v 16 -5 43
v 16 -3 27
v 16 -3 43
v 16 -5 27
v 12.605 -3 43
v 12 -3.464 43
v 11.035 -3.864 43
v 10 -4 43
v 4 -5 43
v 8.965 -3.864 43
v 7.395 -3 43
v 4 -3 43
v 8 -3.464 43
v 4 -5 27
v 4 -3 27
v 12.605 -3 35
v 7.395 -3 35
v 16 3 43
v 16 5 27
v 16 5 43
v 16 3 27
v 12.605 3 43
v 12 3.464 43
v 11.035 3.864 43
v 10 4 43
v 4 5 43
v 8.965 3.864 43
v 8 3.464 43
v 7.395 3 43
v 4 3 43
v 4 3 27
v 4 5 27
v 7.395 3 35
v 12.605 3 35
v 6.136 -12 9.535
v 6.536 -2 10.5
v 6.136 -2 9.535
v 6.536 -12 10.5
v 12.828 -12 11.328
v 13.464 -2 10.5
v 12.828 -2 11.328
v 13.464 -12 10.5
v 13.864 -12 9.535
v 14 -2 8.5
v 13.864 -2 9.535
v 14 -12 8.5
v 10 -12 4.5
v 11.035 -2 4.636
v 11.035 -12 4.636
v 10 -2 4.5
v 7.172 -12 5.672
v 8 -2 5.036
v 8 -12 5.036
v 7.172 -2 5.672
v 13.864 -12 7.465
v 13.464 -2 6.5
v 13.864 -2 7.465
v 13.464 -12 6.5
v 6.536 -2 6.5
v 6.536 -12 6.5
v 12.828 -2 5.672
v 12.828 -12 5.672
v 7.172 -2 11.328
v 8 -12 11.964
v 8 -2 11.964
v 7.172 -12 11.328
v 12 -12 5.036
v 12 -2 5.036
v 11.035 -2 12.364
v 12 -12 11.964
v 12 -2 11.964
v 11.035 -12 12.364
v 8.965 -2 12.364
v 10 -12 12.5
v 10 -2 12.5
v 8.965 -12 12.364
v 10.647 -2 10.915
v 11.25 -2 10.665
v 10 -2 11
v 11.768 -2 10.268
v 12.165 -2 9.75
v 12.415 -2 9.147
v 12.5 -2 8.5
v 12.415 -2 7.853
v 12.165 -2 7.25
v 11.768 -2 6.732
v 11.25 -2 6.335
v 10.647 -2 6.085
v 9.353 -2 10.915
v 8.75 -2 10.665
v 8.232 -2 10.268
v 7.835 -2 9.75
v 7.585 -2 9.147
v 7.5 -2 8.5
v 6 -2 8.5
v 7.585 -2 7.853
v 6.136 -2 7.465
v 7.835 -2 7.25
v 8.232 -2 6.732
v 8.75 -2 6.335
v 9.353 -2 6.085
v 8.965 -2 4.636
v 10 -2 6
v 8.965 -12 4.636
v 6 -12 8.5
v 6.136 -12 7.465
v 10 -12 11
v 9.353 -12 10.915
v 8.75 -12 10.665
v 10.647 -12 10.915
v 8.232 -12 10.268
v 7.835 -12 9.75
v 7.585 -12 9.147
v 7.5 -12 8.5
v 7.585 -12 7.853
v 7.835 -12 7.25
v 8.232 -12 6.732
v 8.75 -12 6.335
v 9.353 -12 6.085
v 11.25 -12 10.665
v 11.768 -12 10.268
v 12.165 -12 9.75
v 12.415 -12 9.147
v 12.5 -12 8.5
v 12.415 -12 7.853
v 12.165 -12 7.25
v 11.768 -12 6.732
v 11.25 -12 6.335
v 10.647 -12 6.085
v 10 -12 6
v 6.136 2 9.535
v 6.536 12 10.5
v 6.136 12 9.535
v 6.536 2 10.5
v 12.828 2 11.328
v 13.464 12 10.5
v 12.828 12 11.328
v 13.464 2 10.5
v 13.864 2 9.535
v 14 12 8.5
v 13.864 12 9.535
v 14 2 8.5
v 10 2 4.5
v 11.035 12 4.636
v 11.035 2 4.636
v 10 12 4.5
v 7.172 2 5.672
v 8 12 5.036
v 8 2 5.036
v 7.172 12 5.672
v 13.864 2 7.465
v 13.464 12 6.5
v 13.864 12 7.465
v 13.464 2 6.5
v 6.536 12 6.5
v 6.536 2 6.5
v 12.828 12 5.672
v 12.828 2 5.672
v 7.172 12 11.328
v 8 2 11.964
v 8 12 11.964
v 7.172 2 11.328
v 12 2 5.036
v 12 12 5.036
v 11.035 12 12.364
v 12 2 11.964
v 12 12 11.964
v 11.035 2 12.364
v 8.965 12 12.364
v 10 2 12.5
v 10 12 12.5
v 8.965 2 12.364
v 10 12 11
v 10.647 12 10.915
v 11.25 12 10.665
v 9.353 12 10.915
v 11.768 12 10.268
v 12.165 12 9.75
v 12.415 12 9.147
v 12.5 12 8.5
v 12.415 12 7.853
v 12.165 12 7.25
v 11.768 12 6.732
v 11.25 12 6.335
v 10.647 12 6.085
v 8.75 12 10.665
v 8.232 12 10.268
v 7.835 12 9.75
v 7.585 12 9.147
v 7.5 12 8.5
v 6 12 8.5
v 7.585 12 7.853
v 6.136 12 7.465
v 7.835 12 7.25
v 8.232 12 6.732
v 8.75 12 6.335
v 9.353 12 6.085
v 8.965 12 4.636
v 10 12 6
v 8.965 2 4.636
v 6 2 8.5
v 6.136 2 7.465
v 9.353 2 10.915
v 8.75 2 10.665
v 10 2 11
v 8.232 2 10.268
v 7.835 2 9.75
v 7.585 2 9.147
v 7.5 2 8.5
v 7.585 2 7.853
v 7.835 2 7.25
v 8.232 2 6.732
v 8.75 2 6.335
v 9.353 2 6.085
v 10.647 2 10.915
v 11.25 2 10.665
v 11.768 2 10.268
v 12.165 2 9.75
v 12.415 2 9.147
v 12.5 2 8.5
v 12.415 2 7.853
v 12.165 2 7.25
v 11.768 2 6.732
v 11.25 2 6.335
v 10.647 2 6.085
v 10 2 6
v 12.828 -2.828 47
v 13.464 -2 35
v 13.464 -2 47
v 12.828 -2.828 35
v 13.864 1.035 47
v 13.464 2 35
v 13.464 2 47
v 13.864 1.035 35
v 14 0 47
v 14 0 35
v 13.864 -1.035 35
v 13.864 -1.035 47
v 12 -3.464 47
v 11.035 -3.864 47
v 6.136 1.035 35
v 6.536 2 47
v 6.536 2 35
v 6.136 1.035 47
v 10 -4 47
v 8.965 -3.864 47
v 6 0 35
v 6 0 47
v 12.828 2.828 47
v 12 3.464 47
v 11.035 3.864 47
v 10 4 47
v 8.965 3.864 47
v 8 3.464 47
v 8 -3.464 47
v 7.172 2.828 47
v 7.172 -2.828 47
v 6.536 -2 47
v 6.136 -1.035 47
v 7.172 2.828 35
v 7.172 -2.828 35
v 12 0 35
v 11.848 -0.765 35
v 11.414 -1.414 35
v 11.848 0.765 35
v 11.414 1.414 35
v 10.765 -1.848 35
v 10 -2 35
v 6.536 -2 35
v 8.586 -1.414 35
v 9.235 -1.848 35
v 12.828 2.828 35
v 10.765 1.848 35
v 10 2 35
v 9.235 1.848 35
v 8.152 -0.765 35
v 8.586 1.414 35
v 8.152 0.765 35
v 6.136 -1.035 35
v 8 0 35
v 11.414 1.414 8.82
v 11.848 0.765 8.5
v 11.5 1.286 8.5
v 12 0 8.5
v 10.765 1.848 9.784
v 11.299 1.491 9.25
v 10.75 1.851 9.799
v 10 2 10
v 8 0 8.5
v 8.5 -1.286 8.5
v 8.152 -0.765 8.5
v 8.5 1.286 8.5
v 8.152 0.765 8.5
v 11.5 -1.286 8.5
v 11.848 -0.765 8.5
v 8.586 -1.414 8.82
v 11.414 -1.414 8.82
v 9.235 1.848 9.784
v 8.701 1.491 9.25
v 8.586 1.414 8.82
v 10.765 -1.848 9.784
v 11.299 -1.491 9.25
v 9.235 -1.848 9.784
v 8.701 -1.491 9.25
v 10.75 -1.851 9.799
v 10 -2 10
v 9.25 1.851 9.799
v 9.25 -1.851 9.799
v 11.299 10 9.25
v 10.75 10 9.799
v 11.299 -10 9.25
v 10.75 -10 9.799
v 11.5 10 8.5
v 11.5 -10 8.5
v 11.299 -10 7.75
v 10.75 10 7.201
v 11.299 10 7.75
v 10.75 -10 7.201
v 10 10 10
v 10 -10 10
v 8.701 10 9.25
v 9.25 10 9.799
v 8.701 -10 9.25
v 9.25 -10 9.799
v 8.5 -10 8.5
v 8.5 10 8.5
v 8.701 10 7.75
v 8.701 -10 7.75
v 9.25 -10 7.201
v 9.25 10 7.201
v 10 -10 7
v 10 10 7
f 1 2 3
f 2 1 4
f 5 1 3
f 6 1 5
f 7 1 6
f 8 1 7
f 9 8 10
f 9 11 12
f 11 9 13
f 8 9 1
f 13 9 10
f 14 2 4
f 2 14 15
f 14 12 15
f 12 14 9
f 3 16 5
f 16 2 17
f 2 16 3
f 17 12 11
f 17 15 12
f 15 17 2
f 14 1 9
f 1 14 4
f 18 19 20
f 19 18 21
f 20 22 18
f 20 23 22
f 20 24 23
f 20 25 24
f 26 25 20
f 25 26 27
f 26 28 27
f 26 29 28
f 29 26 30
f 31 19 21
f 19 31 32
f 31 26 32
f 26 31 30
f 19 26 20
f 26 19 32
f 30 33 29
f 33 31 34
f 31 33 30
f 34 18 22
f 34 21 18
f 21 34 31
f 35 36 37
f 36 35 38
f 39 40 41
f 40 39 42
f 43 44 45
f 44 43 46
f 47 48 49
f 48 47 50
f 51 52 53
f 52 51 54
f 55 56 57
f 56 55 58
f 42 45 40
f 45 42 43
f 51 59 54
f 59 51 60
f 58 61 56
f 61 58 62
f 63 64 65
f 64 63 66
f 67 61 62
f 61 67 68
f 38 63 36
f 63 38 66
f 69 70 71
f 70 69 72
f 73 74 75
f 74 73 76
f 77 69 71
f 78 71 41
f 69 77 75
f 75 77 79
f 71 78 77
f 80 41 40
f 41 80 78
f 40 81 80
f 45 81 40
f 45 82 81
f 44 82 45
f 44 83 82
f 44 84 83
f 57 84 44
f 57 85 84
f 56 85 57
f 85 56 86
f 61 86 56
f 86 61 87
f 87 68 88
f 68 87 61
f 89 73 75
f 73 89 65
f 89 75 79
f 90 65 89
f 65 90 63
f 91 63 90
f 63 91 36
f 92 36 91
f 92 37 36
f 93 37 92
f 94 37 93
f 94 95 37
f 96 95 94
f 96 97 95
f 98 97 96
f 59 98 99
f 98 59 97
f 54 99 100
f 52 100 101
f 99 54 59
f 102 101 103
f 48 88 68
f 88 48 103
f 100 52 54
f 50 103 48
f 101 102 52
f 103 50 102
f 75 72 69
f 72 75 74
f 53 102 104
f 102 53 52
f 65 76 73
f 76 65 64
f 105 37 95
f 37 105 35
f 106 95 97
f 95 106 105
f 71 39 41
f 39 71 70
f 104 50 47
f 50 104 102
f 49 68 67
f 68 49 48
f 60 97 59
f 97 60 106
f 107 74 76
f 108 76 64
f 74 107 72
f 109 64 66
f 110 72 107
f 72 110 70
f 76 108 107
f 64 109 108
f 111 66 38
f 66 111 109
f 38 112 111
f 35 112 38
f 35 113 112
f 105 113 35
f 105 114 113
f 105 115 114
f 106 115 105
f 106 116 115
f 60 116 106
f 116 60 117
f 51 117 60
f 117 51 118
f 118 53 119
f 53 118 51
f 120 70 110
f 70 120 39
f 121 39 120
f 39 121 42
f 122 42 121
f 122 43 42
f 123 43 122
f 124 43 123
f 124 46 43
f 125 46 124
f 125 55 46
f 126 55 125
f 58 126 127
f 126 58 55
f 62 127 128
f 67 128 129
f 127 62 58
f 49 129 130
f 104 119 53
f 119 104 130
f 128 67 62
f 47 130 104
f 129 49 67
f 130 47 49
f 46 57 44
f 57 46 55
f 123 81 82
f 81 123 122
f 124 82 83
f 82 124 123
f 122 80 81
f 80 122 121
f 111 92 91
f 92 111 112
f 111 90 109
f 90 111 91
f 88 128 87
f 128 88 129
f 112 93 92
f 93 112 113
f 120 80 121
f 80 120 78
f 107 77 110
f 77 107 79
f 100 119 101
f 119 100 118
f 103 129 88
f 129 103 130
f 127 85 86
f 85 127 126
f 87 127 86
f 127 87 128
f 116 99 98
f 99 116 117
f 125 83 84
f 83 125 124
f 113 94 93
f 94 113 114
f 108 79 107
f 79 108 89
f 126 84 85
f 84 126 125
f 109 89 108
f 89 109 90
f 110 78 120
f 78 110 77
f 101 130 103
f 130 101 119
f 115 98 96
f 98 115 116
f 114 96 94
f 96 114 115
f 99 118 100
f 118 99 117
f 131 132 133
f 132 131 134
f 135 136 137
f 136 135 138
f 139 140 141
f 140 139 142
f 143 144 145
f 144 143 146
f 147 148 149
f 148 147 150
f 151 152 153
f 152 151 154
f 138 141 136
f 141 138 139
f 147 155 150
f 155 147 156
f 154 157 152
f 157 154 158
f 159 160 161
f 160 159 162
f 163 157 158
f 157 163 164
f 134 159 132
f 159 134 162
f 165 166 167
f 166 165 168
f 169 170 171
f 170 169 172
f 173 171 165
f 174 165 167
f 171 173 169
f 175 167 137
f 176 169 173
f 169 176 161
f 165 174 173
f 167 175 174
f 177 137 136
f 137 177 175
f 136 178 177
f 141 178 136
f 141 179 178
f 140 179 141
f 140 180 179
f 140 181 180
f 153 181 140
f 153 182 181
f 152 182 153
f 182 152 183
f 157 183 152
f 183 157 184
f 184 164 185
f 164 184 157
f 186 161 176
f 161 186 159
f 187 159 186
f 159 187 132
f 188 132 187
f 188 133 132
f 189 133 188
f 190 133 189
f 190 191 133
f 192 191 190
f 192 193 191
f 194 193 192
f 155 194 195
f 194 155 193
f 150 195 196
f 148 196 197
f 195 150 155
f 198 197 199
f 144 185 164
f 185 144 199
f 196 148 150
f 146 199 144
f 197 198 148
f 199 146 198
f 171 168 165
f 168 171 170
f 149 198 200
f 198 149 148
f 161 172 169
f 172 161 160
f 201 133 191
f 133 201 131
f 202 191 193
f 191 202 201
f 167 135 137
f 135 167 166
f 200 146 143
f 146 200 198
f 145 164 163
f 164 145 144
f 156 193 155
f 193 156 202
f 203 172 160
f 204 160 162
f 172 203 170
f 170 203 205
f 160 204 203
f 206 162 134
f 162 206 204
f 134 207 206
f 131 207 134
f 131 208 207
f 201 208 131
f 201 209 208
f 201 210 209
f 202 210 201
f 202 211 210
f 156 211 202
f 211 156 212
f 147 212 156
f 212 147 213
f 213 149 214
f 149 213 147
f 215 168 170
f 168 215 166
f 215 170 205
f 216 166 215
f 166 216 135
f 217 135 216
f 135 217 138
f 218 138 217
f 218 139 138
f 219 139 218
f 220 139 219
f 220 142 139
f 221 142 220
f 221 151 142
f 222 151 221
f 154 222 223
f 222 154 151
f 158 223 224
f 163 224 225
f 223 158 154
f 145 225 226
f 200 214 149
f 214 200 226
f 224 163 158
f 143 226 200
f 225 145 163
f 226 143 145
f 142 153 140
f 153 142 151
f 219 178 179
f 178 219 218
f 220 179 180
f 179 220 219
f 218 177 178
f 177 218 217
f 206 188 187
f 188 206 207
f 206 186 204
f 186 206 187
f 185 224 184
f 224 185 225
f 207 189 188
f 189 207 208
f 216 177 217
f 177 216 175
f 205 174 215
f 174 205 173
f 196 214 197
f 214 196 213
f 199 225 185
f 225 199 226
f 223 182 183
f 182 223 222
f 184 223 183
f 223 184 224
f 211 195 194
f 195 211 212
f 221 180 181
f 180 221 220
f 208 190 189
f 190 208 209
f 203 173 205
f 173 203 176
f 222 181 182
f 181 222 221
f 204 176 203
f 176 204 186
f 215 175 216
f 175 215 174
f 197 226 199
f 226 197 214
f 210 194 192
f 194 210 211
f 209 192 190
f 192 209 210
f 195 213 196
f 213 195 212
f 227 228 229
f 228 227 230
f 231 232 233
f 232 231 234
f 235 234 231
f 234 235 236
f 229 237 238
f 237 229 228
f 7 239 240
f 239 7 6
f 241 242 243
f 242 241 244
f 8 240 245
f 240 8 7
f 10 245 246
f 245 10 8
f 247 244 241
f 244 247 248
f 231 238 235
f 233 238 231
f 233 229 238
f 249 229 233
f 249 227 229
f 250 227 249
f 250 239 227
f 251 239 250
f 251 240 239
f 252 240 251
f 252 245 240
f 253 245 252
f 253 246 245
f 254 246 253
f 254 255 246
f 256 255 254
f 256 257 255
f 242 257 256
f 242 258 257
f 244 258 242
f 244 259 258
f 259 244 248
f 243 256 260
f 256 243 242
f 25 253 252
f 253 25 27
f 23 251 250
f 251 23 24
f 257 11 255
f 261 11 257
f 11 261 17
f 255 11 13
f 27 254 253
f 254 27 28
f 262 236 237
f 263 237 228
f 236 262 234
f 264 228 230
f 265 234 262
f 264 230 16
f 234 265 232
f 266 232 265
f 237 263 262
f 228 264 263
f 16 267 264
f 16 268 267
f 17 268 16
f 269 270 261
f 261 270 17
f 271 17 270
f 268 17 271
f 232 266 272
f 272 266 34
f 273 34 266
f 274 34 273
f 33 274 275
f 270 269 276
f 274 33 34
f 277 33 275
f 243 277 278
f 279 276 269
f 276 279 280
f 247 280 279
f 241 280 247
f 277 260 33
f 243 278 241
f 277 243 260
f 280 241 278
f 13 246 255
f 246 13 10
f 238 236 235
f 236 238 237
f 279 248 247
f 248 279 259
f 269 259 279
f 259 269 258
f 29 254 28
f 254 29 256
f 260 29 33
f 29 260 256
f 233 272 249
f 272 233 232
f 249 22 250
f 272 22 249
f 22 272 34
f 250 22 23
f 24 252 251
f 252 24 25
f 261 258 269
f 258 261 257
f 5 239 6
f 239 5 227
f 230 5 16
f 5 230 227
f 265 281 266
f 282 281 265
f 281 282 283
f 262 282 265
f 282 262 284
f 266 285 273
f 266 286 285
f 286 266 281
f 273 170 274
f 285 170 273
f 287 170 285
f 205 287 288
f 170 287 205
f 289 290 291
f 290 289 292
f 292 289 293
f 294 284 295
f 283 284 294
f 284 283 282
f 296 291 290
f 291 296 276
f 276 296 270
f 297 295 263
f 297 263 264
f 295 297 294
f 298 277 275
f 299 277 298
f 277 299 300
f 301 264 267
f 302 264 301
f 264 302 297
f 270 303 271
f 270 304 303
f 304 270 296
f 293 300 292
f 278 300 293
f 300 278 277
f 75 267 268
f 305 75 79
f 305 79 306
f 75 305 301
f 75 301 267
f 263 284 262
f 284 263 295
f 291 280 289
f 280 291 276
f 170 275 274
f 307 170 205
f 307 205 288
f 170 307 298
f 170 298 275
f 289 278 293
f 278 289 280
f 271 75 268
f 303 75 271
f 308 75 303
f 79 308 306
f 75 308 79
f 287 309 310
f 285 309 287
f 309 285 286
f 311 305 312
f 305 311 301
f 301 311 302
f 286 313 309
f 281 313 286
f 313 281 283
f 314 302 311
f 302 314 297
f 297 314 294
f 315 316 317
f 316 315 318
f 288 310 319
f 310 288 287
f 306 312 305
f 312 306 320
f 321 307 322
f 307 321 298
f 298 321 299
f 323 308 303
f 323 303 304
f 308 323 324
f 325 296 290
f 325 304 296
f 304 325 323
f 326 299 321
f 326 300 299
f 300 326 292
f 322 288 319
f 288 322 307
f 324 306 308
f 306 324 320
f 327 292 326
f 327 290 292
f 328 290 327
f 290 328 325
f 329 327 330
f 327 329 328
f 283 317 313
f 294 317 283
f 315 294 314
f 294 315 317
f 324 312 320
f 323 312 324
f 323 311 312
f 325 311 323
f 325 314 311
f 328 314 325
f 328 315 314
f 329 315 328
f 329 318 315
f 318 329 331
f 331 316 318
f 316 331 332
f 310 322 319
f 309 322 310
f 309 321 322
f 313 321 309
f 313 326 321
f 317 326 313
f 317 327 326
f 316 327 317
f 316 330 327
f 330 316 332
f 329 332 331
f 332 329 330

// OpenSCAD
// file: wheel.scad
include <parameters.scad>

module wheel(r, width, idler = false) {
    rotate([90, 0, 0]) {
        color(matRubber)
            difference() {
                cylinder(r = r, h = width, center = true, $fn = 48);
                cylinder(r = r - 2.5, h = width + 1, center = true, $fn = 48);
            }

        color(matAluminum)
            cylinder(r = r - 3, h = width - 2, center = true, $fn = 32);

        color(matAluminum)
            cylinder(r = idler ? 5.5 : 4.5, h = width + 3, center = true, $fn = 24);

        for (i = [0 : 5])
            rotate([0, 0, i * 60])
                color(matAluminum)
                    cube([2.5, 3, width - 1], center = true);
    }
}

module driveWheel(r, width) {
    wheel(r, width, true);

    rotate([90, 0, 0])
        for (i = [0 : 11])
            rotate([0, 0, i * 30])
                color(matDarkSteel)
                    translate([r - 0.5, 0, 0])
                        cube([4, width + 2, 3.5], center = true);
}
// file: track.scad
include <parameters.scad>
use <wheel.scad>

//================ TRACK =================//
// One seamless rubber belt: a closed band that follows a stadium
// (two straight runs joined by semicircular caps around the idler /
// drive wheels). Built as a single extruded 2D ring so there is NO
// link seam. The wheels ride inside the loop.

// 2D stadium outline: two disk caps radius `c` at x=±xcap, hulled,
// forming the centerline fill. Difference of an outer and inner
// stadium yields the constant-wall-thickness belt ring.
module stadium2d(xCap, radius) {
    hull() {
        translate([-xCap, 0]) circle(r = radius, $fn = 96);
        translate([xCap, 0]) circle(r = radius, $fn = 96);
    }
}

// Belt ring in the X/Y-cap plane (centered on the wheel axis row).
// innerR = trackRadius - beltHalf, outerR = trackRadius + beltHalf.
module beltRing() {
    halfT = beltThickness / 2;
    difference() {
        stadium2d(idlerX, trackRadius + halfT);
        stadium2d(idlerX, trackRadius - halfT);
    }
}

module trackBelt() {
    // Extrude the Y ring into the +Z direction and lay it into the
    // track plane: rotate so the belt thickness spans X*Y like the links.
    color(matRubber)
        translate([0, 0, idlerZ])
            rotate([90, 0, 0])
                linear_extrude(height = trackWidth, center = true)
                    beltRing();
}

module trackLinks() {
    // Belt is now a single continuous band; keep classic moulded-pad
    // look by adding a subtle tread overlay on the outer surface.
    trackBelt();
}

module trackAssembly() {
    for (x = roadPositions)
        translate([x, 0, roadZ])
            wheel(roadRadius, trackWidth, false);

    translate([-idlerX, 0, idlerZ])
        wheel(idlerRadius, trackWidth, true);
    translate([idlerX, 0, idlerZ])
        driveWheel(idlerRadius, trackWidth);

    trackLinks();
}
// file: hydraulic.scad
include <parameters.scad>
use <track.scad>

//================ HYDRAULIC JACK WHEEL =================//
// Lightweight electric linear actuator. Aluminum construction.

module hydraulicJackWheel(extension = hydrExtendAmount) {
    mountZ = chassisBottom;
    barrelTopZ = mountZ + hydrBarrelHeight / 2;
    rodBottomZ = mountZ - extension;

    // Mounting bracket — aluminum plates.
    for (side = [-1, 1])
        color(matAluminum)
            translate([hydrMountX, side * 4, mountZ])
                cube([12, 2, hydrBarrelHeight + 4], center = true);

    // Barrel — aluminum.
    color(matAluminum)
        translate([hydrMountX, hydrMountY, barrelTopZ])
            cylinder(r = hydrBarrelRadius, h = hydrBarrelHeight, center = true, $fn = 24);

    // Piston rod — chrome steel.
    color(matChrome)
        translate([hydrMountX, hydrMountY, (barrelTopZ + rodBottomZ) / 2])
            cylinder(r = hydrRodRadius,
                     h = abs(barrelTopZ - rodBottomZ),
                     center = true, $fn = 16);

    // Two wheels at the bottom — aluminum hubs, rubber tyres.
    for (side = [-1, 1])
        translate([hydrMountX, hydrMountY + side * 7, rodBottomZ]) {
            color(matAluminum)
                rotate([90, 0, 0])
                    difference() {
                        cylinder(r = hydrWheelRadius, h = hydrWheelWidth, center = true, $fn = 24);
                        cylinder(r = hydrWheelRadius - 1.5, h = hydrWheelWidth + 1, center = true, $fn = 24);
                    }
        }

    // Axle connecting both wheels — aluminum.
    color(matAluminum)
        translate([hydrMountX, hydrMountY, rodBottomZ])
            rotate([90, 0, 0])
                cylinder(r = 1.5, h = 20, center = true, $fn = 12);
}

module tiltedTrack(y, angle = trackTilt) {
    translate([0, y, 0])
        translate([liftPivotX, 0, liftPivotZ])
            rotate([0, angle, 0])
                translate([-liftPivotX, 0, -liftPivotZ])
                    trackAssembly();
}
// file: parameters.scad
// Shared parameters for tracked wheelchair prototype
// NOTE: 1 unit = 1 cm (seat target 450 mm = 45 units above ground).
$fn = 48;

//================ MATERIALS =================//
// Frame: aluminum 6061-T6 (lightweight)
// Seat: carbon fiber T700 + honeycomb (ultralight)
// Suspension: rubber bushings (lightweight)
// Axles: aluminum 7075-T6 (1/3 weight of steel)
matSteel      = [0.35, 0.36, 0.38];   // hardware / fasteners only
matDarkSteel  = [0.25, 0.26, 0.28];
matRubber     = [0.12, 0.12, 0.14];   // track belt + bushings
matAluminum   = [0.55, 0.57, 0.60];   // primary frame material
matChrome     = [0.70, 0.72, 0.75];
matCarbon     = [0.15, 0.15, 0.18];   // (unused — seat now aluminum)
matLeather    = [0.45, 0.25, 0.12];   // leather cushion color

//================ TRACKS =================//
trackLength = 82;
trackWidth = 14;
trackCenterY = 28;

idlerRadius = 10;
idlerX = trackLength / 2;
idlerZ = 16;
roadRadius = 7;
roadZ = 13;  // road wheels roll on the belt's inner surface (belt upper edge at this height)
roadPositions = [-22, -6, 10, 24];

linkLength = 10;
linkWidth = trackWidth + 2;
linkThickness = 3;
linkGap = 1;
// Belt centerline clears the idler wheels plus link half-thickness,
// so the links ride on the wheels instead of clipping through them.
trackRadius = idlerRadius + linkThickness / 2;  // = 11.5
beltThickness = 3;
groundZ = idlerZ - trackRadius;  // bottom of track = ground level (4.5)

//================ HYDRAULIC JACK WHEEL =================//
trackTilt = 0;
liftPivotX = idlerX;
liftPivotZ = idlerZ;
// Electric linear actuator (24V DC, 500kg, 300mm stroke).
// 1/3 weight of hydraulic system.
hydrWheelRadius = 4;
hydrWheelWidth = 10;
hydrBarrelRadius = 4;        // smaller barrel (mini actuator)
hydrBarrelHeight = 12;       // shorter barrel
hydrRodRadius = 2;
// At full extension the jack wheel rests on the ground:
// mountZ 35 - groundZ 4.5 - wheelR 4 = 26.5
hydrExtend = 26.5;
hydrRetracted = 0;
hydrExtendAmount = hydrExtend;
hydrMountX = 10;   // jack mount x; moved forward (from 24) for first-stair clearance
hydrMountY = 0;

//================ CHASSIS =================//
chassisLength = 82;
chassisBottom = 35;
chassisHeight = 12;

//================ SEAT =================//
// Seat geometry: flat aluminium pan + leather cushion + slim backrest.
// Seat surface rides at 450 mm (45 units) above the ground.
// topZ = idlerZ + seatTopOffset = 49.5, ground at 4.5 -> seat 45 above ground.
seatPanLength = 66;
seatPanWidth = 66;
backShellHeight = 72;
headrestHeight = 16;
seatTopOffset = 45 - trackRadius;  // = 33.5
// Backrest recline (deg from vertical).
seatBackRecline = 8;

//================ FOOTREST =================//
footrestWidth = 34;
footrestLength = 28;
footrestThickness = 3;       // 3mm aluminum plate
footrestHeight = idlerZ + 12;
footrestFrontX = -30 - footrestLength / 2;  // plate center, extends forward from arm end

// Folding footplate pivots at the end of the L-bracket arm.
footPivotX = -30;                           // end of L-bracket horizontal arm
footPivotZ = idlerZ + seatTopOffset - 7;    // arm height (panB - 2)
footHeelGuard = true;                       // optional heel guard
footToeGuard = false;                       // optional toe guard (off by default)

//================ ARMRESTS =================//
armPivotX = idlerX - 14;                     // rear post at the seat back
armLength = 68;                              // full-length pad (covers seat depth)
armPadHeight = idlerZ + seatTopOffset + 19;  // pad top = elbow height (~19 above seat top)
armPadWidth = 8;
armPadThick = 4;
// main file
include <parameters.scad>
use <hydraulic.scad>
hydraulicJackWheel();
